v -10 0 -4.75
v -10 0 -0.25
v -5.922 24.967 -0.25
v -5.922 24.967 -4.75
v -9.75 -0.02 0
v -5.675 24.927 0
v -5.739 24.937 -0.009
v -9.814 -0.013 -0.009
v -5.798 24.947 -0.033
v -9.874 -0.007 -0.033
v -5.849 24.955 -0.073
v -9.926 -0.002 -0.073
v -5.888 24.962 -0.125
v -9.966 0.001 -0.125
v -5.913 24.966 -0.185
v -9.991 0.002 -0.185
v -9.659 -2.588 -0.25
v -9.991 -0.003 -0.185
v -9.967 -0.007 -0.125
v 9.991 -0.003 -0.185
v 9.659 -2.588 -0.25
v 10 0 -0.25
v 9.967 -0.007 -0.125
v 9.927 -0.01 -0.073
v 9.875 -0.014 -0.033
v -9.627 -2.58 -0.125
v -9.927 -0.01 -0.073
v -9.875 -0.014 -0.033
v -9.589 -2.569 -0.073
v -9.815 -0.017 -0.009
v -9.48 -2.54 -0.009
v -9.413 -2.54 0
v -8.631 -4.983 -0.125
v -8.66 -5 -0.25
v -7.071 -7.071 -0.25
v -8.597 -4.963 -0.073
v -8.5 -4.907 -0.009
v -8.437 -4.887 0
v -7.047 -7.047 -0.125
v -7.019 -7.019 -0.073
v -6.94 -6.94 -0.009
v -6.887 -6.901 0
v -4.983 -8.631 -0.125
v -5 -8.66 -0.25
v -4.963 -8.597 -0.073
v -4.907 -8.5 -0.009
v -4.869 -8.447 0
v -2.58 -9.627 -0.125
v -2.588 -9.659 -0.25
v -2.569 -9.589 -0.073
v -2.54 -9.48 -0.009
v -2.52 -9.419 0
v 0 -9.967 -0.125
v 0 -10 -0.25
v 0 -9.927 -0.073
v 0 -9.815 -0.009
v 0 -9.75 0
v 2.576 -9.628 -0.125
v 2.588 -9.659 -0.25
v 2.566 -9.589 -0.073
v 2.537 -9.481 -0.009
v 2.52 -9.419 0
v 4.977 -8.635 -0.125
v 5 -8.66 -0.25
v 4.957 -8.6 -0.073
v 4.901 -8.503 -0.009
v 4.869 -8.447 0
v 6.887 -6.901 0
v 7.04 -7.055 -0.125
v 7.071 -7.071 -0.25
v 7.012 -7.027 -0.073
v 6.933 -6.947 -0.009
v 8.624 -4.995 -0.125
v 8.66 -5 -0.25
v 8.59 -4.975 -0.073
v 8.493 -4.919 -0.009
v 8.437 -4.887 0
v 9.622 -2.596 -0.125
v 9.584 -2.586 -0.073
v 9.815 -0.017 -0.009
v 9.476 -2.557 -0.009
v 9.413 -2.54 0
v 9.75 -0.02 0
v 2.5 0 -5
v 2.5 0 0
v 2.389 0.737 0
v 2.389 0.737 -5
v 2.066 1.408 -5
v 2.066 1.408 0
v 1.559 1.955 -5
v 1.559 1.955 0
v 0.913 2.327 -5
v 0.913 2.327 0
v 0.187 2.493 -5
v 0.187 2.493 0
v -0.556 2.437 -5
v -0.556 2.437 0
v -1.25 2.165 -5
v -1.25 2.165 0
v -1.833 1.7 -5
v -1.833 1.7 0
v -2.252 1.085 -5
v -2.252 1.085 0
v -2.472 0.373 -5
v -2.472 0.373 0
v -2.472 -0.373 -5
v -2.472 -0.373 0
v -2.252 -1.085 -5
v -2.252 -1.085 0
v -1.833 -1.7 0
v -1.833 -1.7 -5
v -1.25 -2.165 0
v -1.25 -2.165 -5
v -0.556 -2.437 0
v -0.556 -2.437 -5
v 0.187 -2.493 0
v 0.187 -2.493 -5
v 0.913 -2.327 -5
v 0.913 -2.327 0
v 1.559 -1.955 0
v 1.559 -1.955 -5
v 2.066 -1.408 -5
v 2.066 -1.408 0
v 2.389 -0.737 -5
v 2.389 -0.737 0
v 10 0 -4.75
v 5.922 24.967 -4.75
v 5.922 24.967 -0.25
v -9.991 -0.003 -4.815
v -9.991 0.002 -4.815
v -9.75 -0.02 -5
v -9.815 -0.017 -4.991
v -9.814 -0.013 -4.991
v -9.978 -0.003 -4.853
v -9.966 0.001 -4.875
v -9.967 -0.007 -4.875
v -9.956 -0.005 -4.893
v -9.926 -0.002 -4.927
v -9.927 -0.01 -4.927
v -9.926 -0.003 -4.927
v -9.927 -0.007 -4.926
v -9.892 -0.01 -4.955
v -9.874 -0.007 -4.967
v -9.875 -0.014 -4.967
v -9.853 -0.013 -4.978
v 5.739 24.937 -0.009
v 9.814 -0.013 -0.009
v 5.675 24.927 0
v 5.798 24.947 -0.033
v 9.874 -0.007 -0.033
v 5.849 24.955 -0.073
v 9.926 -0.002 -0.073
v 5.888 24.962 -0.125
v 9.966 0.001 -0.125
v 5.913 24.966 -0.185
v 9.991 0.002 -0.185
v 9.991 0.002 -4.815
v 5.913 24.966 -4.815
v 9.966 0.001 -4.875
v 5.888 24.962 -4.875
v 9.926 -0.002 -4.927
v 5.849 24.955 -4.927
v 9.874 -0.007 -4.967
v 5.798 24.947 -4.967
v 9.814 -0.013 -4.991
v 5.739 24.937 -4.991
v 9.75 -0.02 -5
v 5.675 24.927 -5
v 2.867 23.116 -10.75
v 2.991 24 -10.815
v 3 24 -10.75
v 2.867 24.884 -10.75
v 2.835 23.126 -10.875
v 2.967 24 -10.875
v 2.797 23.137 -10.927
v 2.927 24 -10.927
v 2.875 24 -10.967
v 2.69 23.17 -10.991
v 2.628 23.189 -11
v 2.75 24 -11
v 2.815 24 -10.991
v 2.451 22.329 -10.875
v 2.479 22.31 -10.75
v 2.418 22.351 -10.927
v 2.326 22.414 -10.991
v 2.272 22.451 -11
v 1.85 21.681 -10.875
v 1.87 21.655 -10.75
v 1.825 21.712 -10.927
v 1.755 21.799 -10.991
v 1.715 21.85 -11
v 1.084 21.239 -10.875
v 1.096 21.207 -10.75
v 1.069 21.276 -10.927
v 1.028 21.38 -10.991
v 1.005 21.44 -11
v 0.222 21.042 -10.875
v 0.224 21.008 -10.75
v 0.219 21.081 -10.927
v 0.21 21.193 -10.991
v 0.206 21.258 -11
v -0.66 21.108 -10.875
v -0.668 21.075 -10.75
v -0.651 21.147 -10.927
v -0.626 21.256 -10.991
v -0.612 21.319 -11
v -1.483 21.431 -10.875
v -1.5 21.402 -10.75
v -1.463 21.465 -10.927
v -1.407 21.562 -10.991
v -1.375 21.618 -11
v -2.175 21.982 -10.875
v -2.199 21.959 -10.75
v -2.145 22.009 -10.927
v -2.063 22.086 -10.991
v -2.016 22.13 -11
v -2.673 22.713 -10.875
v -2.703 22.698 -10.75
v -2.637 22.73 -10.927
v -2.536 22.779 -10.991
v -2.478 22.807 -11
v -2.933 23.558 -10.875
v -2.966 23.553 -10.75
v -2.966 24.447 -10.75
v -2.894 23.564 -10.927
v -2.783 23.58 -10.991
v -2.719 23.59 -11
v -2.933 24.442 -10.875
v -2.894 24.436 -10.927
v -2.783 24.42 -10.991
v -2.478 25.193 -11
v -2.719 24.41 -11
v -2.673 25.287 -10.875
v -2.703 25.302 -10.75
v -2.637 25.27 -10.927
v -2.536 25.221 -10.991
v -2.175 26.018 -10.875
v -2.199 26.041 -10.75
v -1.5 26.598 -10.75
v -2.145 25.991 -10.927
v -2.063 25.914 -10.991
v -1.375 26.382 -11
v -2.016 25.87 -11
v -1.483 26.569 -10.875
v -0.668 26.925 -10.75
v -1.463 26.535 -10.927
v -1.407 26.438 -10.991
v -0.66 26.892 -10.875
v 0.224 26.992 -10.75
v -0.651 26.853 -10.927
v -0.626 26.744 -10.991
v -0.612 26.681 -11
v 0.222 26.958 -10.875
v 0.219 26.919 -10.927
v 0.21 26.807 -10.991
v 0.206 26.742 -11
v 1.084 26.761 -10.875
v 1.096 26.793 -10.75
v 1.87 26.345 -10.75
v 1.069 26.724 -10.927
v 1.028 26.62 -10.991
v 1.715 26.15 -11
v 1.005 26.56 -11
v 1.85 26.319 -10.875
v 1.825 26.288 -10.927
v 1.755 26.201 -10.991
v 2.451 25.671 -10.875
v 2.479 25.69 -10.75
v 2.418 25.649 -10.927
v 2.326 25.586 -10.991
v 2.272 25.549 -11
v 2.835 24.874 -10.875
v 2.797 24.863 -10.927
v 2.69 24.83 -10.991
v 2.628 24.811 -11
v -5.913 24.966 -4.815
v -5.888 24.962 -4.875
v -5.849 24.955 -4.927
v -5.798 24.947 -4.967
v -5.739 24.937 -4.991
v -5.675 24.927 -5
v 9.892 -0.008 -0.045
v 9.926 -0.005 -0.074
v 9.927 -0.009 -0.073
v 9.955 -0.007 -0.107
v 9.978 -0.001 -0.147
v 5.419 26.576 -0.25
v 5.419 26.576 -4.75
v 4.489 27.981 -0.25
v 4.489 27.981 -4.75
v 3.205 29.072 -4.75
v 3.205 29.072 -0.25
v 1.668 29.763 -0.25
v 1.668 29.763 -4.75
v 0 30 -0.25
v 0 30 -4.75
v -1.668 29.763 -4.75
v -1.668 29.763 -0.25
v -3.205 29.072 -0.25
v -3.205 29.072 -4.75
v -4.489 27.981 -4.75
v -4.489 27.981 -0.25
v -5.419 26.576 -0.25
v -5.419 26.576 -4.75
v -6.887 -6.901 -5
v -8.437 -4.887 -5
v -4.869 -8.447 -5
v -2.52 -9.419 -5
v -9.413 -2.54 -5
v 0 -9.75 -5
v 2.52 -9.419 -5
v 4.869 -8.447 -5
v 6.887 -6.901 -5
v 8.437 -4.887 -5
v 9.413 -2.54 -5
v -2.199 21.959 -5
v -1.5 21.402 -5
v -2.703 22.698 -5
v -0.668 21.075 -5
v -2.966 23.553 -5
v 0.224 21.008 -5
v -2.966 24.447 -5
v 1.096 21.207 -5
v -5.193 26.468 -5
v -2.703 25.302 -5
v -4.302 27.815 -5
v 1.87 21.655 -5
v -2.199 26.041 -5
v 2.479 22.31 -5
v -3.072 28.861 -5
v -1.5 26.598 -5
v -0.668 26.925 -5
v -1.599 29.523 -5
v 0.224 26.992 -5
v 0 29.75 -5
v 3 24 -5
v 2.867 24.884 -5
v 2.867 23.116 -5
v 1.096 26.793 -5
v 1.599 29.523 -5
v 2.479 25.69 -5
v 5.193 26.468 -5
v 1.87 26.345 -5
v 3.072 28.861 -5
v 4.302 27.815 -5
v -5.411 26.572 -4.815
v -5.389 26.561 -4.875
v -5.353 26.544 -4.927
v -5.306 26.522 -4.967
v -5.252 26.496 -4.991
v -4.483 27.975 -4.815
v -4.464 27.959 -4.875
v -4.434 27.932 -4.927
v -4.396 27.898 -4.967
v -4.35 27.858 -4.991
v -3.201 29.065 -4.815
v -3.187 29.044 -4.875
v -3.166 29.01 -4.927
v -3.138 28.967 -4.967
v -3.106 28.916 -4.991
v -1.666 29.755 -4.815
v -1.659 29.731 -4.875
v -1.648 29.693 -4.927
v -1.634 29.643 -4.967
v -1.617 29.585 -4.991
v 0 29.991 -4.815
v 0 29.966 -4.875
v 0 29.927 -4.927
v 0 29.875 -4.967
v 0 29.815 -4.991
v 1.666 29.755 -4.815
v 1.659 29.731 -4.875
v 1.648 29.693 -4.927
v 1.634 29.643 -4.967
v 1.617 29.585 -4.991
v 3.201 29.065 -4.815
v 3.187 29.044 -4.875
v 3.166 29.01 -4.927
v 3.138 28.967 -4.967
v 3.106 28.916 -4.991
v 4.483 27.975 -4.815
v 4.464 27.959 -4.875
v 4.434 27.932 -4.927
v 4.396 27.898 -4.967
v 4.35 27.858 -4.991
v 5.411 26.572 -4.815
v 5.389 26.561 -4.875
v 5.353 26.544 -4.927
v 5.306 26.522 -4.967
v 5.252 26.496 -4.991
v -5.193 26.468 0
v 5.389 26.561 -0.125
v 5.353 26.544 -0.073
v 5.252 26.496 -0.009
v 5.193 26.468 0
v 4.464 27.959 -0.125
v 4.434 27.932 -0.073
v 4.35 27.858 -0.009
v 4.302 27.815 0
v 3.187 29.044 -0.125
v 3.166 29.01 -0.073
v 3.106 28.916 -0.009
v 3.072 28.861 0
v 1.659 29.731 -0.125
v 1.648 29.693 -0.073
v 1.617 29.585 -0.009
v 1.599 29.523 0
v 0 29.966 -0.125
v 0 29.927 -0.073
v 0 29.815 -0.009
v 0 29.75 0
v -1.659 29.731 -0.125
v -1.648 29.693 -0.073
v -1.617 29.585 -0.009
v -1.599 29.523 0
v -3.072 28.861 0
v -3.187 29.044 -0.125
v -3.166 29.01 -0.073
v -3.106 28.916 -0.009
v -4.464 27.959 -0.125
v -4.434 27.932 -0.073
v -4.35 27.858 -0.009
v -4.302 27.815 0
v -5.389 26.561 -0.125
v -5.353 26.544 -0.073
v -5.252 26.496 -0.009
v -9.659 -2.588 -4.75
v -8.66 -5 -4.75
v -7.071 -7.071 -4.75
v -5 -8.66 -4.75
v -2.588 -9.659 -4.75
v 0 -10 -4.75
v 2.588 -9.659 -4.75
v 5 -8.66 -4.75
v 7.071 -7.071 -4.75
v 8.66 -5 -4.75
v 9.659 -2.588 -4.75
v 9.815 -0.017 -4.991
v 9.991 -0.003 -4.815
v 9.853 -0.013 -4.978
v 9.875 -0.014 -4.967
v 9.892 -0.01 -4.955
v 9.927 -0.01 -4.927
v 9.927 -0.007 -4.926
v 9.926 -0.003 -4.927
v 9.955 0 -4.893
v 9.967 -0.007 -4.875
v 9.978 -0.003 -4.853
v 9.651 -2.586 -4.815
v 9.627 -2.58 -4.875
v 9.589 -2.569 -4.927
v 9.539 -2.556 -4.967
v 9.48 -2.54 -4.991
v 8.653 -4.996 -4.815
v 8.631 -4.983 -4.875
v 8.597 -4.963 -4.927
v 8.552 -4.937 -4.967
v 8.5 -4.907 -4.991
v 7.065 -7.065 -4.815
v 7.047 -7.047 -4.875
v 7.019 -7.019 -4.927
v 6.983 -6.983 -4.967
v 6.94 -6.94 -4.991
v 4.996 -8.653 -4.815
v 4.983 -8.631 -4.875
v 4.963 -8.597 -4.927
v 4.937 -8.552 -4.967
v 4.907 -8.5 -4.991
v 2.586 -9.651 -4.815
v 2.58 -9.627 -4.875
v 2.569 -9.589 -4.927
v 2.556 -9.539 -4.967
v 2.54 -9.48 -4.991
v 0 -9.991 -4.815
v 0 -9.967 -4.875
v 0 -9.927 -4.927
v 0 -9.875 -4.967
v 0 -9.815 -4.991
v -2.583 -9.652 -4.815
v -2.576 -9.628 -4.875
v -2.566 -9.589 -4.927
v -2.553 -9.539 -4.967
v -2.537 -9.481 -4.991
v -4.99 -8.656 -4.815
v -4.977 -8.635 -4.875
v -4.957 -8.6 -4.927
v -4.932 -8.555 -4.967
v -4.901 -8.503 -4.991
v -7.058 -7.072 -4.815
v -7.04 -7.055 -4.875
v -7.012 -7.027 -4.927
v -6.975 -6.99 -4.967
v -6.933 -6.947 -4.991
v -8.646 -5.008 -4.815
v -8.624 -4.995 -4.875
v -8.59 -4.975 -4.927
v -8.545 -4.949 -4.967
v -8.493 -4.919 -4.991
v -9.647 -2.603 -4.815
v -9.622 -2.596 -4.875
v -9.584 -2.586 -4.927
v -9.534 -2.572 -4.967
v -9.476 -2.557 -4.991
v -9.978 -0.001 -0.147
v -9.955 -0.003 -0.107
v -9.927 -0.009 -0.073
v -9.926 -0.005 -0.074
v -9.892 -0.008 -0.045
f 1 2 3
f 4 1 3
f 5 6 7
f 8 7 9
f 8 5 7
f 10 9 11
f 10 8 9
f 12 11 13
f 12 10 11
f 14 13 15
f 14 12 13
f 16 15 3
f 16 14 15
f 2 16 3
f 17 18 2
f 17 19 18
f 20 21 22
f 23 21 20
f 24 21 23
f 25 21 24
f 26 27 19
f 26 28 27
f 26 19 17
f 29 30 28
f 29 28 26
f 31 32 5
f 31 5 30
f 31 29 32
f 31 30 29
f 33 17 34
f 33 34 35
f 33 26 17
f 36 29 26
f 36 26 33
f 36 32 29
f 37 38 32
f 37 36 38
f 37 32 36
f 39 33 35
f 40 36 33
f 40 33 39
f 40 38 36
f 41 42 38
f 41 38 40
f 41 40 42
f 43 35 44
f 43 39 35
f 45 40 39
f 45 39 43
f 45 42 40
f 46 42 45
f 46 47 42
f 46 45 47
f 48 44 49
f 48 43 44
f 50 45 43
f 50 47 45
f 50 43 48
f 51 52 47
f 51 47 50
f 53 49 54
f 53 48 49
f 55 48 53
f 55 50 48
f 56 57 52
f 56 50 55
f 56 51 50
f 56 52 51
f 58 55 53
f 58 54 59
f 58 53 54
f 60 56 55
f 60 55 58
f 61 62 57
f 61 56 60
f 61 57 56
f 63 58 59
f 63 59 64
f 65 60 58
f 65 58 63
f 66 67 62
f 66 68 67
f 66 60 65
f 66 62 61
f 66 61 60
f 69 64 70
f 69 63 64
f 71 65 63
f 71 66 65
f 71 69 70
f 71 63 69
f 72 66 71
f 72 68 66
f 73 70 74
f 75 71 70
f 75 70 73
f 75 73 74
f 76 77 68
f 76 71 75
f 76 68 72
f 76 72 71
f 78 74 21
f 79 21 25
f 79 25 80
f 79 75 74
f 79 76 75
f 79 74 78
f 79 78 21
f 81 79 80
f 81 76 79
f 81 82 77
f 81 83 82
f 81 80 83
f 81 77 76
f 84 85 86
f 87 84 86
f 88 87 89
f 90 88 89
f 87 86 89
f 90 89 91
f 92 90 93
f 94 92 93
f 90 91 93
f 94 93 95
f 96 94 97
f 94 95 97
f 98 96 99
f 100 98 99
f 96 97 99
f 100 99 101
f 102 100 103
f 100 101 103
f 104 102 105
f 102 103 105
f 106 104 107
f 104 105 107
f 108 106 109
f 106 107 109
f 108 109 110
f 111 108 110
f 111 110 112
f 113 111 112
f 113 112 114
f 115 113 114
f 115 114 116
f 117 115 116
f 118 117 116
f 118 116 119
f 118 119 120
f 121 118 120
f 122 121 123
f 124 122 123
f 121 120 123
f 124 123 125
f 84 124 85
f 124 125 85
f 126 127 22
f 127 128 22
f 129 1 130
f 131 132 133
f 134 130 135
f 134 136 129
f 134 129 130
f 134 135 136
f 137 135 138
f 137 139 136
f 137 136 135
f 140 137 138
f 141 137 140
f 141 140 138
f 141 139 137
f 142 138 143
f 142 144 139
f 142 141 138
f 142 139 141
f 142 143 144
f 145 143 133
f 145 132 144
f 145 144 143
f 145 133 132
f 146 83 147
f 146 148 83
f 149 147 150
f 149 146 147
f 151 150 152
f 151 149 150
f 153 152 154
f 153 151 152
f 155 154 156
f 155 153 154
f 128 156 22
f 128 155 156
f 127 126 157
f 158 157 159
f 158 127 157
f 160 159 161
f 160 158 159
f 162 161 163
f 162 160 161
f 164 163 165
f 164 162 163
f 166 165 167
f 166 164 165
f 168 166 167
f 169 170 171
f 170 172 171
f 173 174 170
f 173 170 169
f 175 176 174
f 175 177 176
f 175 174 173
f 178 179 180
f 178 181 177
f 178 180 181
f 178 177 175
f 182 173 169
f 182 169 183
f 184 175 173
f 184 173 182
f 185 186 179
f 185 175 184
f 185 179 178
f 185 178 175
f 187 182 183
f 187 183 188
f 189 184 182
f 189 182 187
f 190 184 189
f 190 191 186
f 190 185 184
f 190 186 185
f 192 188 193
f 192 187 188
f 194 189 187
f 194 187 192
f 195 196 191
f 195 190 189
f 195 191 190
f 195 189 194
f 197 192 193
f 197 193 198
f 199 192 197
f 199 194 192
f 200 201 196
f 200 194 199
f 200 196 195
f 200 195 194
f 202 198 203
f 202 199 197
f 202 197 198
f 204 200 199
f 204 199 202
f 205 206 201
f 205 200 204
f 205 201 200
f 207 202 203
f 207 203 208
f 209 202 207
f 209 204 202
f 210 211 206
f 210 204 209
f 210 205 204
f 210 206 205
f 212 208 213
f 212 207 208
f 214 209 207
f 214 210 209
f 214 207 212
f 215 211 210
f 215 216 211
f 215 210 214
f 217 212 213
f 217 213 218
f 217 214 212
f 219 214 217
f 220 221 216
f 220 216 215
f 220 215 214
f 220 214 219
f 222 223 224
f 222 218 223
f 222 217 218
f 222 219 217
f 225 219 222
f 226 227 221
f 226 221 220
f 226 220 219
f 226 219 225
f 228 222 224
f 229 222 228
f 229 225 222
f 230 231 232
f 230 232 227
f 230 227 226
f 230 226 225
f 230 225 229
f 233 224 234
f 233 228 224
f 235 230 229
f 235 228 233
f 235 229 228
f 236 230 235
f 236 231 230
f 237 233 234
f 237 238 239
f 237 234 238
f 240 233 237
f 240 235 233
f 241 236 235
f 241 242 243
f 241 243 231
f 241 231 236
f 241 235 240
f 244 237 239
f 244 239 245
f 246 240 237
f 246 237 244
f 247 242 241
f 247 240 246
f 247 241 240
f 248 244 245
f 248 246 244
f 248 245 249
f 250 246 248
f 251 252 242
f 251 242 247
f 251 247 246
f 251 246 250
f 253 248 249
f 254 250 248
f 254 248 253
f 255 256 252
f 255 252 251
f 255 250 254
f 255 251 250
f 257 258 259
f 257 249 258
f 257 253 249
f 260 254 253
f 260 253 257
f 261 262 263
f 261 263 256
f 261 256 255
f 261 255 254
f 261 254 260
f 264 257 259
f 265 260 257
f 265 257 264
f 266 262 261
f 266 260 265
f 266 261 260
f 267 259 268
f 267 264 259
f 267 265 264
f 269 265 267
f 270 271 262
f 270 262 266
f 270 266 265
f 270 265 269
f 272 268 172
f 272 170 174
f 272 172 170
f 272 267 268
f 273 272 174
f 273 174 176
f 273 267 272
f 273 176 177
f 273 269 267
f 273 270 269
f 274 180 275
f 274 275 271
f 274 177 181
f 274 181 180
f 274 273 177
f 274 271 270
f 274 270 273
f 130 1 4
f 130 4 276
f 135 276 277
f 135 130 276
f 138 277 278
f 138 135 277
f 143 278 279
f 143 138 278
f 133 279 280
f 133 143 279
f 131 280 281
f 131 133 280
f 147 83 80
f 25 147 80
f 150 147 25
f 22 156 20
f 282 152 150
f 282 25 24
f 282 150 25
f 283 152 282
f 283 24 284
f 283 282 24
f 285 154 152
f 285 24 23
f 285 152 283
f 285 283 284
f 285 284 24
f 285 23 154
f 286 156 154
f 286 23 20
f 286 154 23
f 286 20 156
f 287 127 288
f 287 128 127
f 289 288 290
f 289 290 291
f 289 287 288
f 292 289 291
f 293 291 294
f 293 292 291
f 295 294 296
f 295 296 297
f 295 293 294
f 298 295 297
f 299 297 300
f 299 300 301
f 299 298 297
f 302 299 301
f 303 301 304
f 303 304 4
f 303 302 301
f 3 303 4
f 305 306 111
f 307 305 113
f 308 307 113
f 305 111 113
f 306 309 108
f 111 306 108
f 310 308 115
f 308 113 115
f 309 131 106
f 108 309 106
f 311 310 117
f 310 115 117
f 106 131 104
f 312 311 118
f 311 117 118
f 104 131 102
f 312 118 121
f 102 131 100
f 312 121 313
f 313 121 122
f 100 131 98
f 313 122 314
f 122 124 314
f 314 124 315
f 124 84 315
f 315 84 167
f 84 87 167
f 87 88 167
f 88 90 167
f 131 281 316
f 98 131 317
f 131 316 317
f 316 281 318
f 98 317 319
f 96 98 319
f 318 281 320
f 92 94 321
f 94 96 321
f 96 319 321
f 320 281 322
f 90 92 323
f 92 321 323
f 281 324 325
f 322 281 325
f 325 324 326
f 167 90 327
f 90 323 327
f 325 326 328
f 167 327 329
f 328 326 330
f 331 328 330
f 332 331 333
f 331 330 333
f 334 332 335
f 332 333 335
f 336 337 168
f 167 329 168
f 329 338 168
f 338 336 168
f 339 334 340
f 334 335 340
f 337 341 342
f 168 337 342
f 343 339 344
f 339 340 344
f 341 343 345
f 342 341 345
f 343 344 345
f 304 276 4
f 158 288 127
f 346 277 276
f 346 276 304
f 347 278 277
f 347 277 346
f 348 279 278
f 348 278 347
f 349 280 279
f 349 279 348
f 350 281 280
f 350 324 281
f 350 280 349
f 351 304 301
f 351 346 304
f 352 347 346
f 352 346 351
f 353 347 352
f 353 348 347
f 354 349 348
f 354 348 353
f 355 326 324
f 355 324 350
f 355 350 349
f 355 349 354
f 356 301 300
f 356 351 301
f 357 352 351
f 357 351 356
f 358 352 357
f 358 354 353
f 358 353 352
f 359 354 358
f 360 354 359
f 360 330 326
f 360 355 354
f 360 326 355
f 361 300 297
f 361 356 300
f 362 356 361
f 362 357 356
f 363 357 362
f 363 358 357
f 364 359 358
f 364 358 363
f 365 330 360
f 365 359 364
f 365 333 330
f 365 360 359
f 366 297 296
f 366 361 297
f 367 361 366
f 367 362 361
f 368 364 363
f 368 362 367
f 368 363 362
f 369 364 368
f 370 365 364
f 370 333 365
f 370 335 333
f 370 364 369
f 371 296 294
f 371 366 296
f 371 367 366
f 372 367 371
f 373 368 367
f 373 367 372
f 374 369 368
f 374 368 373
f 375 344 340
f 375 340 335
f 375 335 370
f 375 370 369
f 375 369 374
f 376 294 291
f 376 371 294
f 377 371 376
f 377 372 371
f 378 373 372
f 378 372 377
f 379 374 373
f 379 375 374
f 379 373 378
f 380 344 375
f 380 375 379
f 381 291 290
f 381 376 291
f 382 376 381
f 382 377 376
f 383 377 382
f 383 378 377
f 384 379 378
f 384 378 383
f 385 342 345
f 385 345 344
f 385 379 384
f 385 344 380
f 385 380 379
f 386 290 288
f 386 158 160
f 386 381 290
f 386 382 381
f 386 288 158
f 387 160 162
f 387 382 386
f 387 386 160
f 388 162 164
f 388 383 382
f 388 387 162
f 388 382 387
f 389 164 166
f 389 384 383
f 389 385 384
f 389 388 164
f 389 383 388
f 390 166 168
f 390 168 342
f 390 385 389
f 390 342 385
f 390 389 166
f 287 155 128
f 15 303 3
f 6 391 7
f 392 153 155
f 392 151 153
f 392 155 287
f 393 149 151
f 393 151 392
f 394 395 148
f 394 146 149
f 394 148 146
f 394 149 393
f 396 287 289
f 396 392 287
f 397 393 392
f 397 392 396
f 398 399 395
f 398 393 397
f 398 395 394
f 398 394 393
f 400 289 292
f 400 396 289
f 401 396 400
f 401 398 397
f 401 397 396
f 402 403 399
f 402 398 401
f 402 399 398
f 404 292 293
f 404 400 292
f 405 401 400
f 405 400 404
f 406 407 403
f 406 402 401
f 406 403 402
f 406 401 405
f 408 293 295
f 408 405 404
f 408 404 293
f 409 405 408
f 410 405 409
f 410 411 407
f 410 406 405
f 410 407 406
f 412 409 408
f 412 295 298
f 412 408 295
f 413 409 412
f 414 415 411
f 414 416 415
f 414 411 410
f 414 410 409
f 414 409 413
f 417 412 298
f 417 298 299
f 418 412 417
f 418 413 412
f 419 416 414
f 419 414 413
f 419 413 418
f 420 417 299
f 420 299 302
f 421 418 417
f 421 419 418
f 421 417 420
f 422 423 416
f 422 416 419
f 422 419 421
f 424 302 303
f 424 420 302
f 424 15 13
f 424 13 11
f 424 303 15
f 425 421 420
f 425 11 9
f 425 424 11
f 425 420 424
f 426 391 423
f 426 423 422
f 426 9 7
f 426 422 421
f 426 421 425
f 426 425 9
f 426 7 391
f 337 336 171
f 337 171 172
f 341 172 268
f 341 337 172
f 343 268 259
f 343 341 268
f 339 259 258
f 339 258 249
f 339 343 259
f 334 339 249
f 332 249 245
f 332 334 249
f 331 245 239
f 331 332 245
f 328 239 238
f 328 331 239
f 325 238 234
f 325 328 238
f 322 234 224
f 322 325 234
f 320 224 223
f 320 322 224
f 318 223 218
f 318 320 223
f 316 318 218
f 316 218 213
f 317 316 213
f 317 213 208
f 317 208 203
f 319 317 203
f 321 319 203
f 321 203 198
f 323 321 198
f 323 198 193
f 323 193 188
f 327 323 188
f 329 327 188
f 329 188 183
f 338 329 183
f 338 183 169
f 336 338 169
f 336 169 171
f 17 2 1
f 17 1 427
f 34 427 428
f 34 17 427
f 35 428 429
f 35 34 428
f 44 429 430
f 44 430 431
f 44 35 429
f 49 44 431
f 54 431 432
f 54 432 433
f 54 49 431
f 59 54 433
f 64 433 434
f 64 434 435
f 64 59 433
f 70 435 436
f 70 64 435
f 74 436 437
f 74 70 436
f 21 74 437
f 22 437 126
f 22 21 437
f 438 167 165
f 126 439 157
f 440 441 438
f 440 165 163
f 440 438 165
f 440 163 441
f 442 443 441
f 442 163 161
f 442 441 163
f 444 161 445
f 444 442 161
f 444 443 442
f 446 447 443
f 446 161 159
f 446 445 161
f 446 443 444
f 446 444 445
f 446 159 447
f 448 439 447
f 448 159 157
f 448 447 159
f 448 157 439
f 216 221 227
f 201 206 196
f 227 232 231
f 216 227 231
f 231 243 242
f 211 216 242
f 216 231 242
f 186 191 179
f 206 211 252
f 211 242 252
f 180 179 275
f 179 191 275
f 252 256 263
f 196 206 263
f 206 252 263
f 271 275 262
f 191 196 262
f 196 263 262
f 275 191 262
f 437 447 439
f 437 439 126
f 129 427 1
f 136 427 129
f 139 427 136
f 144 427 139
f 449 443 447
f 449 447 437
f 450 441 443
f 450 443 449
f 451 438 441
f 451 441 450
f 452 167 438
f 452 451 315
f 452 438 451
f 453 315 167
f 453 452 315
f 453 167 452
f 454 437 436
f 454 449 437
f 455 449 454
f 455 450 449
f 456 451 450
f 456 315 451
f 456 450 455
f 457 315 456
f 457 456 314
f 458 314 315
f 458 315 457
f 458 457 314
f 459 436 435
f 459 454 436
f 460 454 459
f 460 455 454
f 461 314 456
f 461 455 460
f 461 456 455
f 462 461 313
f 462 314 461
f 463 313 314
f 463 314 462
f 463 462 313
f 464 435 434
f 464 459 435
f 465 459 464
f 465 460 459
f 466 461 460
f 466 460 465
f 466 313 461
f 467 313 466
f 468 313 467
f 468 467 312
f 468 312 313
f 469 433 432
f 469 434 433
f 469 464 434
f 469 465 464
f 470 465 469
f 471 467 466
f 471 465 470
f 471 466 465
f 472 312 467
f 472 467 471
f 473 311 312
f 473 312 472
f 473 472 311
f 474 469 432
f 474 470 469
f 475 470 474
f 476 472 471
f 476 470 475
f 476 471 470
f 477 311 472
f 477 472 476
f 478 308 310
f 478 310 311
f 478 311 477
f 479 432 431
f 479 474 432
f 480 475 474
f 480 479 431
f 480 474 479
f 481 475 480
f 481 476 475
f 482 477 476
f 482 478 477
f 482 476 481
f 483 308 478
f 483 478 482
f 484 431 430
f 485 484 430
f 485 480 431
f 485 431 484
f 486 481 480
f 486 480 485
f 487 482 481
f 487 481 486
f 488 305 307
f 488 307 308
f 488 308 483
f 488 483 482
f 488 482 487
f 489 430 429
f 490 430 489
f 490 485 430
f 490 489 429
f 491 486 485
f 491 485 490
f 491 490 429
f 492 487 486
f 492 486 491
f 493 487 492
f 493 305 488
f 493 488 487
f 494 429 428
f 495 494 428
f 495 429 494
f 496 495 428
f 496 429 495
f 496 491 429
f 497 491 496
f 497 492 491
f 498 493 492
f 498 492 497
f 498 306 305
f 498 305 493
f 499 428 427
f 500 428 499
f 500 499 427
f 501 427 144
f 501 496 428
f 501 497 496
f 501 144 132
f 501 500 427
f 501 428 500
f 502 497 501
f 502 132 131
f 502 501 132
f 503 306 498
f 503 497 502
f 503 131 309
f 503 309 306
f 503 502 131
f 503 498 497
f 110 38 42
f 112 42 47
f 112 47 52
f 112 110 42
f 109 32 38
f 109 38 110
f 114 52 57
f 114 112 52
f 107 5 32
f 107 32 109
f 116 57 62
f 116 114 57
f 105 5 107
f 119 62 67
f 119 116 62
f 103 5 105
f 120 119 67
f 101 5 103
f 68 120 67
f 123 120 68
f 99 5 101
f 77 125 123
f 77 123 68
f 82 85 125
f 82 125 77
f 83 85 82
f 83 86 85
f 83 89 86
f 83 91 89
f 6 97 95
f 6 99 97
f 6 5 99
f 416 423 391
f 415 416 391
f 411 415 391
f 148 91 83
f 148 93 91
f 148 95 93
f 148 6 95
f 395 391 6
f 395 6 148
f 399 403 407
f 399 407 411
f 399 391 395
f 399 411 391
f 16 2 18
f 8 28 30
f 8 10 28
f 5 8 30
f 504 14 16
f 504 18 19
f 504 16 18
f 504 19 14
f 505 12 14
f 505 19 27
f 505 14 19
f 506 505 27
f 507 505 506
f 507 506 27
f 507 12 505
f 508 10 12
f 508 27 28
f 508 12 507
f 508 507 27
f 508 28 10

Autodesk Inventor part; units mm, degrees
ref_plane "YZ Plane" through (0, 0, 0) normal (1, 0, 0) x (0, 1, 0)
ref_plane "XZ Plane" through (0, 0, 0) normal (0, 1, 0) x (-1, 0, 0)
ref_plane "XY Plane" through (0, 0, 0) normal (0, 0, 1) x (1, 0, 0)
sketch "Sketch1" plane through (0, 0, 0) normal (0, 0, 1) x (1, 0, 0)
  line L0 (-10, 0) -> (10, 0) construction
  arc A0 (-10, 0) -> (10, 0) centre (0, 0) ccw
  line L1 (-10, 0) -> (-5.9215, 24.9673)
  arc A1 (5.9215, 24.9673) -> (-5.9215, 24.9673) centre (0, 24) ccw
  line L2 (5.9215, 24.9673) -> (10, 0)
  line L3 (0, 0) -> (0, 15.7423) construction
  dimension "d0" = 24
  dimension "d1" = 6
  dimension "d2" = 10
extrude "Extrusion1" add sketch "Sketch1" against normal blind 5
sketch "Sketch2" plane through (0, 0, 0) normal (0, 0, 1) x (1, 0, 0)
  circle A0 centre (0, 24) radius 3
  arc A1 (5.9215, 24.9673) -> (-5.9215, 24.9673) centre (0, 24) ccw projected
  point P0 (0, 0)
  dimension "d5" = 6
extrude "Extrusion2" add sketch "Sketch2" against normal blind 11
sketch "Sketch3" plane through (0, 0, 0) normal (0, 0, 1) x (1, 0, 0)
  circle A0 centre (0, 0) radius 2.5
  dimension "d14" = 5
extrude "Extrusion3" cut sketch "Sketch3" against normal up to surface (5 mm away)
fillet "Fillet1" radius 0.25 9 edges at (-3, 24, -11) (0, 30, -5) (-7.9608, 12.4836, -5) (7.9608, 12.4836, -5) (0, -10, -5) (0, -10, 0) (0, 30, 0) (-7.9608, 12.4836, 0) (7.9608, 12.4836, 0)
properties part number "201 part 2"
